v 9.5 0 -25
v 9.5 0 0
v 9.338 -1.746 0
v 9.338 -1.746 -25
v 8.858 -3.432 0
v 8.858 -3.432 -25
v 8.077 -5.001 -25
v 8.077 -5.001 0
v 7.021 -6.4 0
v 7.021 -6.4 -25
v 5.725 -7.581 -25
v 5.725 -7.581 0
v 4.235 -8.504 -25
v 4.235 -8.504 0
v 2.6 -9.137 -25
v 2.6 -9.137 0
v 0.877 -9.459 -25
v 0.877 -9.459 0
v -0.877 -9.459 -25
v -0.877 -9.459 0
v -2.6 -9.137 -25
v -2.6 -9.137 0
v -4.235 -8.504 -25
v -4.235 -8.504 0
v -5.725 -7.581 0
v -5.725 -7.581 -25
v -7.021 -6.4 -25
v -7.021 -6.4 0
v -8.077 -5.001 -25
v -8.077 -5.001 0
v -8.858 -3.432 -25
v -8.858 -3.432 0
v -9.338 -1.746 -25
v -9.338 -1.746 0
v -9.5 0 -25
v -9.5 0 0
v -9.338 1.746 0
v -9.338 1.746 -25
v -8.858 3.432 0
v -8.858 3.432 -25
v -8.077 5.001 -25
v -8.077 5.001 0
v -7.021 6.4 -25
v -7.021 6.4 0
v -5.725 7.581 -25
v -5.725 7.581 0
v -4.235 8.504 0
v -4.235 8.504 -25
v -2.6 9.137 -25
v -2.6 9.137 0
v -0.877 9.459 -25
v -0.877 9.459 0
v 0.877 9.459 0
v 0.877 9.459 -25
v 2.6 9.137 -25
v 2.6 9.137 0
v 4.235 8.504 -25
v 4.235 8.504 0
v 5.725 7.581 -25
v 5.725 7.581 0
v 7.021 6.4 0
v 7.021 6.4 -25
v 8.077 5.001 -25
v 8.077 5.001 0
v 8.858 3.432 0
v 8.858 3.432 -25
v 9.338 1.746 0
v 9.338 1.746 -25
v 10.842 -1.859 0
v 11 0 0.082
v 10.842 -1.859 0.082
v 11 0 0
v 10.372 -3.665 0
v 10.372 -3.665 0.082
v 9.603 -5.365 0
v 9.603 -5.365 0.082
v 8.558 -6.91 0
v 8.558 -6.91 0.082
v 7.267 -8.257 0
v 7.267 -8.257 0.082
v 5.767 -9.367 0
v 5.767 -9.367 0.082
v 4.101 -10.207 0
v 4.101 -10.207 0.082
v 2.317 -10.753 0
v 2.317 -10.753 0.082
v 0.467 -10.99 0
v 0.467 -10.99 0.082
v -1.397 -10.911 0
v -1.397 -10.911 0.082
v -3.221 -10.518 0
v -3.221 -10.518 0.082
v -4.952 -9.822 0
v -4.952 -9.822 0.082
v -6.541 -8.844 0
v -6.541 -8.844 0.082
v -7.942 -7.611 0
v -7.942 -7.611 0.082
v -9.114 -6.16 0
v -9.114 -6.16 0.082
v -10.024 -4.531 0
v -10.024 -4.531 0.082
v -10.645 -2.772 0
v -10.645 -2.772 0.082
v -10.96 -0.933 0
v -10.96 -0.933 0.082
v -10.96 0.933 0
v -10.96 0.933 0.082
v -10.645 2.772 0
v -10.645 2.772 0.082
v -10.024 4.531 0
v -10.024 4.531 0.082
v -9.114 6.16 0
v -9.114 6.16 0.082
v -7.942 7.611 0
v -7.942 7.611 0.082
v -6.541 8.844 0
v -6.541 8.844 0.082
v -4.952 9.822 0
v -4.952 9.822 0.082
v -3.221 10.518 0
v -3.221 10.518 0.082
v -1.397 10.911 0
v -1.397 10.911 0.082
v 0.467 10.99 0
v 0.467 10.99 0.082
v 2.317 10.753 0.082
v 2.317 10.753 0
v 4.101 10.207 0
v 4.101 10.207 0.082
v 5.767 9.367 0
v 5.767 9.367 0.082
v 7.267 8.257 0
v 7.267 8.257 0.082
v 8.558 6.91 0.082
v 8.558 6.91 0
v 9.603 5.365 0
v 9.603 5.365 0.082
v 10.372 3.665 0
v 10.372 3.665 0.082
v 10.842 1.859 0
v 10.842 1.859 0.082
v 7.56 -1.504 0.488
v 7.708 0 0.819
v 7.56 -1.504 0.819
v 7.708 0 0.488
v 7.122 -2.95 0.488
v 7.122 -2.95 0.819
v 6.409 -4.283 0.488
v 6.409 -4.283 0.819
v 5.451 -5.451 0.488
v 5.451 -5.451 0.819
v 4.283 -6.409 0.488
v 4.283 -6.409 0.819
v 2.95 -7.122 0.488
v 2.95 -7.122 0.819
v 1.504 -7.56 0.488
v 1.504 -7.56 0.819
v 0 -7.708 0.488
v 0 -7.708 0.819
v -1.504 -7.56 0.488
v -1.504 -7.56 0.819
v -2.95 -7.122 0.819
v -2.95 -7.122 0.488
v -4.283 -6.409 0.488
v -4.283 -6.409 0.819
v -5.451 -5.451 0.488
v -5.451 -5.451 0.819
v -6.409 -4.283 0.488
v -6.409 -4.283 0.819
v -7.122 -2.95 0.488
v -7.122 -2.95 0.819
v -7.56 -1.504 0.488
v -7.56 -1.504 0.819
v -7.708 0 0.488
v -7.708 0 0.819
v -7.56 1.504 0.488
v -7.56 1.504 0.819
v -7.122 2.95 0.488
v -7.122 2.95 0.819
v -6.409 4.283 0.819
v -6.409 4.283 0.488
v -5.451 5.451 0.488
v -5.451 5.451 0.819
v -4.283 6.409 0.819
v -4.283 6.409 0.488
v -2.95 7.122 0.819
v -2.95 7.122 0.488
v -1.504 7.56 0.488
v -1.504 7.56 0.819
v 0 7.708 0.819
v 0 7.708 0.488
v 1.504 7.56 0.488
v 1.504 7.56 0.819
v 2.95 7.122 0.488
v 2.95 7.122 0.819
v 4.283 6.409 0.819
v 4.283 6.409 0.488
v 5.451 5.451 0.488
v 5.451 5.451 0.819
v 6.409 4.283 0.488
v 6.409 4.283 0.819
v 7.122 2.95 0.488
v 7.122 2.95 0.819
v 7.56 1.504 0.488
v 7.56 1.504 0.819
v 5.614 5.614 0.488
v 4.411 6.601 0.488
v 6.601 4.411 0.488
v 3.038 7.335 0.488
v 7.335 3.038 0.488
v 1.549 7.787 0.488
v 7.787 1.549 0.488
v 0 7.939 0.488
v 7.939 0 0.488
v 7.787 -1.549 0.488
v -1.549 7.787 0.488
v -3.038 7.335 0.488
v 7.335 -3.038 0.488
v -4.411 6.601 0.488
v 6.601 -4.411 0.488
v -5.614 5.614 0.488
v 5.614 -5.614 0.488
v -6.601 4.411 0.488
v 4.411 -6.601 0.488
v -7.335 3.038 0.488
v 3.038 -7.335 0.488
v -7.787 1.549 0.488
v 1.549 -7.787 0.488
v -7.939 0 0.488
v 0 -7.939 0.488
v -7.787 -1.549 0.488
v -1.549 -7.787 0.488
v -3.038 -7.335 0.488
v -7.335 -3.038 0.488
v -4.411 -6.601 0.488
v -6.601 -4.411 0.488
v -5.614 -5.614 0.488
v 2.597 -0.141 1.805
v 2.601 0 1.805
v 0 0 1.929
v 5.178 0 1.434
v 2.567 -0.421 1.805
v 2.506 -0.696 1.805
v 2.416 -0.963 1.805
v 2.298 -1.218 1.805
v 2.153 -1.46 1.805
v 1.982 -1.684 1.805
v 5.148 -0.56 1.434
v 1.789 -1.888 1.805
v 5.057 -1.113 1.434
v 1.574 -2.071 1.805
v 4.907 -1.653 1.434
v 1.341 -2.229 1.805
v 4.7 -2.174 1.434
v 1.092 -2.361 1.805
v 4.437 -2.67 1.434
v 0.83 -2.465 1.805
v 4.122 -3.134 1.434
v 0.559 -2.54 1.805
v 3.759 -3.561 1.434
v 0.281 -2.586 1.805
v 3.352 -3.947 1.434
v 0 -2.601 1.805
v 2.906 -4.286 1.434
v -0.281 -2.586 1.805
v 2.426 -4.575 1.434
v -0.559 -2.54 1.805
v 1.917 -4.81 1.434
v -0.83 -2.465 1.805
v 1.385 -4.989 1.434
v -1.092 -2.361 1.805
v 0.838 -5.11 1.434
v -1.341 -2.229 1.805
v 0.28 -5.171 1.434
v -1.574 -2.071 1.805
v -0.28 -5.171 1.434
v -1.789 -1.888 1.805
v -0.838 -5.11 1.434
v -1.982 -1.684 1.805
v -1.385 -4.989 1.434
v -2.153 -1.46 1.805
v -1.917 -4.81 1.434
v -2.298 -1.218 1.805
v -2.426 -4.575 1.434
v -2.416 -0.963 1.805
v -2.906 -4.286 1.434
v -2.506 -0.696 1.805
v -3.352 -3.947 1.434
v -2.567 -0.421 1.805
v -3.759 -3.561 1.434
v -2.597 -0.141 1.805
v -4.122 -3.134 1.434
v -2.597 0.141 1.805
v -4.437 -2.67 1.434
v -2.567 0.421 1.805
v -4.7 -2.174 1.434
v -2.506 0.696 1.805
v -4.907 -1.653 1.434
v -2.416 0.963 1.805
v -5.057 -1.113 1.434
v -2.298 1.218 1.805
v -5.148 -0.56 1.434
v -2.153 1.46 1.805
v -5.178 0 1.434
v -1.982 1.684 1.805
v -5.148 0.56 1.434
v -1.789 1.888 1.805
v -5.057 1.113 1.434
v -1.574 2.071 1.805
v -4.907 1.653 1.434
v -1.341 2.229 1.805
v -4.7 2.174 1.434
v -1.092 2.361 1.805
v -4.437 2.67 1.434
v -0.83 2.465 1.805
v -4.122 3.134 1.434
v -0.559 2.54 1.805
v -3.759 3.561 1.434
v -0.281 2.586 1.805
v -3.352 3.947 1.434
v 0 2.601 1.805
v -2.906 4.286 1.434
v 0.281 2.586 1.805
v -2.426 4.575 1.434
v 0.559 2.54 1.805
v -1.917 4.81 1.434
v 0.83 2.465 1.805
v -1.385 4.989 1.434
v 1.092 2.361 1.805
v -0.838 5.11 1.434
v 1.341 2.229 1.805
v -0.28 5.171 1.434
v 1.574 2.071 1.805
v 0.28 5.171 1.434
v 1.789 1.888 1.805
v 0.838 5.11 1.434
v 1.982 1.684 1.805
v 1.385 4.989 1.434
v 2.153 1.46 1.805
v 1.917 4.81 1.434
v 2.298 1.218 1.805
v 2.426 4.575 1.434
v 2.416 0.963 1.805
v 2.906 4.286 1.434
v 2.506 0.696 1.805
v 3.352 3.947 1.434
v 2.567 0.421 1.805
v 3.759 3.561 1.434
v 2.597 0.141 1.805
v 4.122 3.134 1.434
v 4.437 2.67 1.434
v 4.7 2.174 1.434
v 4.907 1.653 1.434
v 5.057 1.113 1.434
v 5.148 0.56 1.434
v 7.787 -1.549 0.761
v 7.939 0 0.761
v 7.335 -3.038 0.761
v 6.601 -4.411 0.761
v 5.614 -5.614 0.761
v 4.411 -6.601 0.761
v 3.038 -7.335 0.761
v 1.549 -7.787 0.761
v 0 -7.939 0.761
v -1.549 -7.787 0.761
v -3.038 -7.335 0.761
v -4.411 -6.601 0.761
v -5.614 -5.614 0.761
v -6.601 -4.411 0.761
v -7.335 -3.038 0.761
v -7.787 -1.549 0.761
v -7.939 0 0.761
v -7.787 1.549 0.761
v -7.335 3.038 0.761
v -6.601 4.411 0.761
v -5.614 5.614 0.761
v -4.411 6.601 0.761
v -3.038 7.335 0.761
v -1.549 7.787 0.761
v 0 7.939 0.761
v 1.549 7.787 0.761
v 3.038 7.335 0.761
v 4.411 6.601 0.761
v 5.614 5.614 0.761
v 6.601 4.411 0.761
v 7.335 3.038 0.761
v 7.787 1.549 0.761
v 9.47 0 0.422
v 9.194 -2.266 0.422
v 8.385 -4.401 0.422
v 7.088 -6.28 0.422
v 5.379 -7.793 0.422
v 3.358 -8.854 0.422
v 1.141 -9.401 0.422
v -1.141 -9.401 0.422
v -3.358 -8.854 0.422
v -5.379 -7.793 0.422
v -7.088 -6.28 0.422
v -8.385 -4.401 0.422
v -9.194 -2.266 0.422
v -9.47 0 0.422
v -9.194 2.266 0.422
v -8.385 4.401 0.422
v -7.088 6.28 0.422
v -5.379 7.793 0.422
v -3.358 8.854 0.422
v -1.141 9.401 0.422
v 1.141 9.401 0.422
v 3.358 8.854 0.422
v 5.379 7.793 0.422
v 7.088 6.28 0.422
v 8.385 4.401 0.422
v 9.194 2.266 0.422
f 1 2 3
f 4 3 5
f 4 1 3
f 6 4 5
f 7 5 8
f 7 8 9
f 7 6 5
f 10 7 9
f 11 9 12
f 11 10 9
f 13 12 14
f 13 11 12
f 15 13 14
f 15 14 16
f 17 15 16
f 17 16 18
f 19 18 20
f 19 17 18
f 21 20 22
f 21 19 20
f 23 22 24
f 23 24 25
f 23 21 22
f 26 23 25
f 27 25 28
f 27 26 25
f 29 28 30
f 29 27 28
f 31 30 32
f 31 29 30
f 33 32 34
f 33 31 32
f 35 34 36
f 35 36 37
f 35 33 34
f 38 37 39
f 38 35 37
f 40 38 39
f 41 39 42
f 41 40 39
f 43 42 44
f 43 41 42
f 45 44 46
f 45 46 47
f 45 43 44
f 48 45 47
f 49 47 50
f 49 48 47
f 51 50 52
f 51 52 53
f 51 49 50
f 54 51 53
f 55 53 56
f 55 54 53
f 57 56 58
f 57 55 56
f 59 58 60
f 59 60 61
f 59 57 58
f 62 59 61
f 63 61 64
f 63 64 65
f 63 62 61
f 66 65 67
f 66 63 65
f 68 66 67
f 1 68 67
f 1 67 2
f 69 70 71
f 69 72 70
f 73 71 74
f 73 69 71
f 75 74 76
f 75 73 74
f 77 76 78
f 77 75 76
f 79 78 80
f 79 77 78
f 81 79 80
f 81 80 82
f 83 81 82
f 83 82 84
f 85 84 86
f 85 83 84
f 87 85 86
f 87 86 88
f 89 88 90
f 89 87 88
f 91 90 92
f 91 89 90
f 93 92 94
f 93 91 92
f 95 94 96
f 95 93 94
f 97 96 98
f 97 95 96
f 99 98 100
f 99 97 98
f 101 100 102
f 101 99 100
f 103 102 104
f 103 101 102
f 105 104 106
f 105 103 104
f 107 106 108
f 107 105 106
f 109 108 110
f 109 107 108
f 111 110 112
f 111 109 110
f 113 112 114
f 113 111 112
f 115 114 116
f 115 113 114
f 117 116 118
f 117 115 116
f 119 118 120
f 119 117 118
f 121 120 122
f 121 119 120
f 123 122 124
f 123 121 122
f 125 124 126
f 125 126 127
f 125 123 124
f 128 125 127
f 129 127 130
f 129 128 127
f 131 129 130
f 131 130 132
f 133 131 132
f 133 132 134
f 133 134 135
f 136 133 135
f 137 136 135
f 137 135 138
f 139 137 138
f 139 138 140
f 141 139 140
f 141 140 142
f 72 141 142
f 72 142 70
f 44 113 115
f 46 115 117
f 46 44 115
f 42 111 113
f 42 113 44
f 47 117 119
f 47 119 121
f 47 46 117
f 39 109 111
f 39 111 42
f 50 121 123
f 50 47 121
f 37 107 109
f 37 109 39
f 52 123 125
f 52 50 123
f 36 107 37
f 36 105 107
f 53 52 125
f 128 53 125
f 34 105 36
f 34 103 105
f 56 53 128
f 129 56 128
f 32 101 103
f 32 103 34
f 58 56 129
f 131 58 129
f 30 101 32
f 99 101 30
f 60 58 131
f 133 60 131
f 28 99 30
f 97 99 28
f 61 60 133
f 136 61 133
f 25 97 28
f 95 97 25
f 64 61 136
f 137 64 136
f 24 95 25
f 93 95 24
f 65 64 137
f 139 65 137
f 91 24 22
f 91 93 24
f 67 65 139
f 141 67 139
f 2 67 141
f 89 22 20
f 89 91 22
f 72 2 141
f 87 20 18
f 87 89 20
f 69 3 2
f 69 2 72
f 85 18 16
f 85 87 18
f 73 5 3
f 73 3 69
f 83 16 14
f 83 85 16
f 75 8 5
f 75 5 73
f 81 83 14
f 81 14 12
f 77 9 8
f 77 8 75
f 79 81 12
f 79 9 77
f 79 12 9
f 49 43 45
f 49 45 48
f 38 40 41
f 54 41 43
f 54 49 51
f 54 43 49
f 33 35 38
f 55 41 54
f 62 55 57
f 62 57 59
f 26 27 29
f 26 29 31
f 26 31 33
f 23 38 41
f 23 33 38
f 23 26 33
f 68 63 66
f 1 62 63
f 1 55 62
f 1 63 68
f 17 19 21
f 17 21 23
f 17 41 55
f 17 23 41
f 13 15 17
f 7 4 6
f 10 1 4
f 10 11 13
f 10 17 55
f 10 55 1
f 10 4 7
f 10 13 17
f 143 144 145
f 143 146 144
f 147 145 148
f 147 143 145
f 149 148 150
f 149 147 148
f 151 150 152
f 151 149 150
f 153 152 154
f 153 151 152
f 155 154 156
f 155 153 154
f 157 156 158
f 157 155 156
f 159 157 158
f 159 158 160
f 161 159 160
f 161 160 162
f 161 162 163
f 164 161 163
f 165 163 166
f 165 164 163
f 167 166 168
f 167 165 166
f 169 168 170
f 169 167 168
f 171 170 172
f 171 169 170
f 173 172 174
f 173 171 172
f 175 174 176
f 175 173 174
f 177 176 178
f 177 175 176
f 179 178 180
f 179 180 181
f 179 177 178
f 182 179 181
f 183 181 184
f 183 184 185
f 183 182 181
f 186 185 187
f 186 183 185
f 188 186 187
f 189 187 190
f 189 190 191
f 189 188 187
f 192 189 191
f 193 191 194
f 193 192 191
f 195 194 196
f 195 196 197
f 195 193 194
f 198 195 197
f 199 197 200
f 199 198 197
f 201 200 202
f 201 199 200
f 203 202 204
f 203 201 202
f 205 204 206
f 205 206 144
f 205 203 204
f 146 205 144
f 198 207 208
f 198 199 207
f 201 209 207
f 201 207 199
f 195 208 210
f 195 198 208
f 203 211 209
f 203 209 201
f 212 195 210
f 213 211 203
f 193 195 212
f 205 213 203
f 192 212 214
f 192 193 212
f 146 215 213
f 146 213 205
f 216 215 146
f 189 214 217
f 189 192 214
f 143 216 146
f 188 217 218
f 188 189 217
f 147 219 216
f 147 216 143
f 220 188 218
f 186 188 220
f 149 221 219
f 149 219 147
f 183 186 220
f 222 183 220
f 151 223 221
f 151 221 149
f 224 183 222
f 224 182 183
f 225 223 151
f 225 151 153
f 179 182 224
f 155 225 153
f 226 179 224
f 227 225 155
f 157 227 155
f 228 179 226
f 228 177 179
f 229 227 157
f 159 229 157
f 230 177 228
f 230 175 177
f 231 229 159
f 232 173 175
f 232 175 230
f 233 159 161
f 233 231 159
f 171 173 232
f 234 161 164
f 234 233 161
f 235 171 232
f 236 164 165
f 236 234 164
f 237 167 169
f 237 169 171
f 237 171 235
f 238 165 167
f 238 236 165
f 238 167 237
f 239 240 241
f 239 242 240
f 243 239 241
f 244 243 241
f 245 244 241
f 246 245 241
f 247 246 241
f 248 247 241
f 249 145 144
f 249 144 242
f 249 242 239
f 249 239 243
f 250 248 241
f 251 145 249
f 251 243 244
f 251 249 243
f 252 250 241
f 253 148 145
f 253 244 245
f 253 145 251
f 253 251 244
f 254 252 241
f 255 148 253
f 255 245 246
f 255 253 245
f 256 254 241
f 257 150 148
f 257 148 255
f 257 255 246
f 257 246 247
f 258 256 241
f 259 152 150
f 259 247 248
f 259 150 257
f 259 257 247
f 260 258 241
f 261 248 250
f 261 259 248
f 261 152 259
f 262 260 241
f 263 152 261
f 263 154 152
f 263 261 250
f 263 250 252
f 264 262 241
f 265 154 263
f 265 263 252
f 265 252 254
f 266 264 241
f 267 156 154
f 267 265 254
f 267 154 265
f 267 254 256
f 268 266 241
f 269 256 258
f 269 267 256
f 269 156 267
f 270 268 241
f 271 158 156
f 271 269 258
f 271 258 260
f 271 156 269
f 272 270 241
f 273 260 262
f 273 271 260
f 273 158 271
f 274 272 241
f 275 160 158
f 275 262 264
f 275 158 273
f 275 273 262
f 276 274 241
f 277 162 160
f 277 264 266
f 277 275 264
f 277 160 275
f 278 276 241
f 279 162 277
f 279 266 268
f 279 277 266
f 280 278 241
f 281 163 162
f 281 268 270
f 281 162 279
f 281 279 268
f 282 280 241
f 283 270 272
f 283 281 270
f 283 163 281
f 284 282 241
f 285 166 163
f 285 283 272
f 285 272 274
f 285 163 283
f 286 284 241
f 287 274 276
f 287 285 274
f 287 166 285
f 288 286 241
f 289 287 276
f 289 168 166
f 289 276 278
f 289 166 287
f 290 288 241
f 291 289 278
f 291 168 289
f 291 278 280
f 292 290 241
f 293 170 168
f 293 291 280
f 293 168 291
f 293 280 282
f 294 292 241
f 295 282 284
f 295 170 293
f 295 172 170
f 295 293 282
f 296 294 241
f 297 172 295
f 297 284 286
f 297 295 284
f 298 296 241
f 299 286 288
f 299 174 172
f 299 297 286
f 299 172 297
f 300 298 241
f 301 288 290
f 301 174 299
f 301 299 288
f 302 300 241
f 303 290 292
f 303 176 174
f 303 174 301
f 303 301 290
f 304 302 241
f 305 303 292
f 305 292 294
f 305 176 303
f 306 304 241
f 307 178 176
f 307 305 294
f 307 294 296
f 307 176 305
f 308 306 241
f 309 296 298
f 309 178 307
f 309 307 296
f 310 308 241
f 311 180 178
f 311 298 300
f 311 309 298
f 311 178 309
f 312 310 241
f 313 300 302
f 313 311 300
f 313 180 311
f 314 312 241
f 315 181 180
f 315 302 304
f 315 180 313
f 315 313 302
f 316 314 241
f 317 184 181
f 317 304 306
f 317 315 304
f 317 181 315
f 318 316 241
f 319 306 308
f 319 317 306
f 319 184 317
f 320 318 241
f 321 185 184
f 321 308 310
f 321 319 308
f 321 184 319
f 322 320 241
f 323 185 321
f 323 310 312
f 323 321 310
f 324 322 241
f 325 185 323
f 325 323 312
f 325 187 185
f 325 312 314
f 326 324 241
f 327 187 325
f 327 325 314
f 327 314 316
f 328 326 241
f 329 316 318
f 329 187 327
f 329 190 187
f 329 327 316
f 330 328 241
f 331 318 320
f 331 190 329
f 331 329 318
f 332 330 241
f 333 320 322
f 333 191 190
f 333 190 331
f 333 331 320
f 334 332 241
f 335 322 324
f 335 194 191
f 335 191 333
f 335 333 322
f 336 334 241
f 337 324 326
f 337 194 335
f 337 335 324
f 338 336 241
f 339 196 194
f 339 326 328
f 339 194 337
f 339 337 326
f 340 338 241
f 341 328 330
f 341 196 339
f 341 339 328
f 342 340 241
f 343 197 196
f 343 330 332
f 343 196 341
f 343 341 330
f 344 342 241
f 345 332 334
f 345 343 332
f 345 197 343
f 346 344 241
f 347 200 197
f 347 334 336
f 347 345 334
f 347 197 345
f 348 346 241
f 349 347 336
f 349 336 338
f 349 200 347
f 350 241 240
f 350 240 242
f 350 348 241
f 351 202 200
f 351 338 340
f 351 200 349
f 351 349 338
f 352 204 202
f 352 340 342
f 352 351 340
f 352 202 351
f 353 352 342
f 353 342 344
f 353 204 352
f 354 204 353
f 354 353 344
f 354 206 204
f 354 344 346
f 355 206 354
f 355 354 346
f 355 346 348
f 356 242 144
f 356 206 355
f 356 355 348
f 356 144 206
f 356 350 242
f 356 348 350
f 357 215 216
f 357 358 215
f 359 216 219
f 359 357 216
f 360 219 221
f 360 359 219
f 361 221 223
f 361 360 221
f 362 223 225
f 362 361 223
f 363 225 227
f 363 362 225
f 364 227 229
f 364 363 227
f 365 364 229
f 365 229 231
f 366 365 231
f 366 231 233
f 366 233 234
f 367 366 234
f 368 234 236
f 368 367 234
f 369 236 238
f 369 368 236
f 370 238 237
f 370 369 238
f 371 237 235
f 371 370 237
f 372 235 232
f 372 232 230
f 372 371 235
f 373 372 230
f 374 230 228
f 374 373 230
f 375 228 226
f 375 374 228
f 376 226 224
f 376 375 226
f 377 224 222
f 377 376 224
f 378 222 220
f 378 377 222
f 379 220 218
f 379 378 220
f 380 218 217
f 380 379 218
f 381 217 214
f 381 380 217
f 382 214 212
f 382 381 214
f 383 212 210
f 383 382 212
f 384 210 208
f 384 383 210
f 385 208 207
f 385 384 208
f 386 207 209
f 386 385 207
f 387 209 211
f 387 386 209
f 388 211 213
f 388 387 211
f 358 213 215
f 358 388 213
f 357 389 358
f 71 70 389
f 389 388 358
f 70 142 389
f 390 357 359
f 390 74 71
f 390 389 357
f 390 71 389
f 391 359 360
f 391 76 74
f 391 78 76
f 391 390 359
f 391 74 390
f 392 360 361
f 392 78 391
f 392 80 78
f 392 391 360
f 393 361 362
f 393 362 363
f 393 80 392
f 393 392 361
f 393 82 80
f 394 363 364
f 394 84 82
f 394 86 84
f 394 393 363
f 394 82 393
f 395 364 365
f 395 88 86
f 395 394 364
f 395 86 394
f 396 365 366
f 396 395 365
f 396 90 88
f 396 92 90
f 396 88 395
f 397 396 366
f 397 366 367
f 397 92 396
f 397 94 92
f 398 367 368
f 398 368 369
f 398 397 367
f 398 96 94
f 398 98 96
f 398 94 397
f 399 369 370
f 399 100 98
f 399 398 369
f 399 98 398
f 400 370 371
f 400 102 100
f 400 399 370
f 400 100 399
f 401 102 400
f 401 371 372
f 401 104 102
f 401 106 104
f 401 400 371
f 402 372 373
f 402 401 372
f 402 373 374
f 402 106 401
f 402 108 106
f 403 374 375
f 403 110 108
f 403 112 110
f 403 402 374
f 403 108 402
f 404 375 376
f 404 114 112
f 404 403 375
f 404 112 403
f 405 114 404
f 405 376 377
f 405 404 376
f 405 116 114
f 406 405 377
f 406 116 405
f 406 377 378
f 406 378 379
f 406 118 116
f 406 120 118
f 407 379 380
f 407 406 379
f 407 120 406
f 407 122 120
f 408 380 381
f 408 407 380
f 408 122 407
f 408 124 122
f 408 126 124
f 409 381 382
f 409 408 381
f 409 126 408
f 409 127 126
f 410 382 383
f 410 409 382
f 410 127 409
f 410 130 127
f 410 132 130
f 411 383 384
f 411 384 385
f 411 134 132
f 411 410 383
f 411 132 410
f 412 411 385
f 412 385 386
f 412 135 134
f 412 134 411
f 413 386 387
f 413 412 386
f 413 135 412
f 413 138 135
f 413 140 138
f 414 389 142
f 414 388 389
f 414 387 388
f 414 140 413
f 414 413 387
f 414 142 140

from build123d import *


with BuildPart() as part:
    # Skica1 → Rotovat1 (revolve)
    with BuildSketch(Plane(origin=(0, 0, 0), x_dir=(1, 0, 0), z_dir=(0, 1, 0))):
        with BuildLine():
            Line((9.5, 0), (9.5, 25))
            Line((9.5, 25), (0, 25))
            Line((0, 25), (0, -1.929477619))
            ThreePointArc((0, -1.929477619), (3.894000592, -1.650357757), (7.70838162, -0.818705261))
            Line((7.70838162, -0.818705261), (7.70838162, -0.488101593))
            Line((7.70838162, -0.488101593), (7.939207246, -0.488101593))
            Line((7.939207246, -0.488101593), (7.939207246, -0.761243378))
            Line((7.939207246, -0.761243378), (11, -0.082108279))
            Line((11, -0.082108279), (11, 0))
            Line((11, 0), (9.5, 0))
        make_face()
    revolve(axis=Axis((0, 0, 3.381080674), (0, 0, -1)))


solid = part.part
